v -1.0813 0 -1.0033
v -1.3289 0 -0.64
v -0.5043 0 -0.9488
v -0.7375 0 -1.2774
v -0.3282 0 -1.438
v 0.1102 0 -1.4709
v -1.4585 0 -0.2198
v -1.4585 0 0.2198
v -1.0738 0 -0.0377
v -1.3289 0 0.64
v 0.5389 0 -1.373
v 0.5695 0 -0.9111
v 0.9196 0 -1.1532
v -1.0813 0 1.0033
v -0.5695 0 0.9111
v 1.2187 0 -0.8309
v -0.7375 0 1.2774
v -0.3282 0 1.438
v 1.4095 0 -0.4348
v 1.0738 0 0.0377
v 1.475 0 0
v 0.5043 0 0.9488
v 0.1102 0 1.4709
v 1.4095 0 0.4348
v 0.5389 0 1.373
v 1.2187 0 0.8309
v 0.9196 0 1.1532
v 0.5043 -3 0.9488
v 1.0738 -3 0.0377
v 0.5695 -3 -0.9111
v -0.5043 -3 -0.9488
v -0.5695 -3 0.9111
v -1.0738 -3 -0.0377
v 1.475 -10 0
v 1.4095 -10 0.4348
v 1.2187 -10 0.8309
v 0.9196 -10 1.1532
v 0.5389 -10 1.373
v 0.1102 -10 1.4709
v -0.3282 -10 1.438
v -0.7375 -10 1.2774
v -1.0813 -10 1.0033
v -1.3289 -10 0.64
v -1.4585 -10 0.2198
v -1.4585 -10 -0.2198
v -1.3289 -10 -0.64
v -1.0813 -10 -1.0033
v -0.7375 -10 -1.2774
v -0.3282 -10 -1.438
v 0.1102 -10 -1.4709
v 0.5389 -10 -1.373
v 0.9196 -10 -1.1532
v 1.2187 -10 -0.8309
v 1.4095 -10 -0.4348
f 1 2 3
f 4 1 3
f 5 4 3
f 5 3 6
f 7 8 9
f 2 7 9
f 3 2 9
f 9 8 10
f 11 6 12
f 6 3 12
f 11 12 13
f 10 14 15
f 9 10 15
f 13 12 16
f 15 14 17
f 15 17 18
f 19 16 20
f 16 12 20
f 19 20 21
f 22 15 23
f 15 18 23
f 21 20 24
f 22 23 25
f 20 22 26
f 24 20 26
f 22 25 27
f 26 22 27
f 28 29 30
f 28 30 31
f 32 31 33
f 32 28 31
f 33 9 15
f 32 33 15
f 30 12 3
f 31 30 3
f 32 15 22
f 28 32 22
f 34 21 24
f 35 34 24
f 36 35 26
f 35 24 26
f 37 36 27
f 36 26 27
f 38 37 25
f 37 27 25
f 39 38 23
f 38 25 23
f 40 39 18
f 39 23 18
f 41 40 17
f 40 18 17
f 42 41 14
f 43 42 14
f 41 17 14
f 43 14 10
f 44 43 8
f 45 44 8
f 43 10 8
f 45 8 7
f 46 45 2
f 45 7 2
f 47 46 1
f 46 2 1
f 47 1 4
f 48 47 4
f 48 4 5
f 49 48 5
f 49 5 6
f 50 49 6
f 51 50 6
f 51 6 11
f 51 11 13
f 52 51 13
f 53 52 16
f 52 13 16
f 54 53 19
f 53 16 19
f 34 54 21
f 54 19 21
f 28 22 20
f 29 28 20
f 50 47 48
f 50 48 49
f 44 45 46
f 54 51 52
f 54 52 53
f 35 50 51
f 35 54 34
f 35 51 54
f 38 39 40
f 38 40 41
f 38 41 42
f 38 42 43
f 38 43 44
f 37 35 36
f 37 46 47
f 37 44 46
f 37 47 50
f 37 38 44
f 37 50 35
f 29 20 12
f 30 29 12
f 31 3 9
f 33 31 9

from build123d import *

# Parameters (mm, degrees)
F0_R     = 1.475
F1_DEPTH = 10
F3_DEPTH = 3


with BuildPart() as f1:
    # F0 (on Front) → F1 (new body)
    with BuildSketch(Plane.XZ):
        Circle(F0_R)
    extrude(amount=F1_DEPTH)

    # F2 (on face) → F3 (cut)
    with BuildSketch(Plane(origin=(0, 0, 0), x_dir=(-1, 0, 0), z_dir=(0, 1, 0))):
        Polygon((-1.073836, 0.037674), (-0.569545, -0.911132), (0.504291, -0.948806), (1.073836, -0.037674), (0.569545, 0.911132), (-0.504291, 0.948806), align=None)
    extrude(amount=-F3_DEPTH, mode=Mode.SUBTRACT)


solid = f1.part
